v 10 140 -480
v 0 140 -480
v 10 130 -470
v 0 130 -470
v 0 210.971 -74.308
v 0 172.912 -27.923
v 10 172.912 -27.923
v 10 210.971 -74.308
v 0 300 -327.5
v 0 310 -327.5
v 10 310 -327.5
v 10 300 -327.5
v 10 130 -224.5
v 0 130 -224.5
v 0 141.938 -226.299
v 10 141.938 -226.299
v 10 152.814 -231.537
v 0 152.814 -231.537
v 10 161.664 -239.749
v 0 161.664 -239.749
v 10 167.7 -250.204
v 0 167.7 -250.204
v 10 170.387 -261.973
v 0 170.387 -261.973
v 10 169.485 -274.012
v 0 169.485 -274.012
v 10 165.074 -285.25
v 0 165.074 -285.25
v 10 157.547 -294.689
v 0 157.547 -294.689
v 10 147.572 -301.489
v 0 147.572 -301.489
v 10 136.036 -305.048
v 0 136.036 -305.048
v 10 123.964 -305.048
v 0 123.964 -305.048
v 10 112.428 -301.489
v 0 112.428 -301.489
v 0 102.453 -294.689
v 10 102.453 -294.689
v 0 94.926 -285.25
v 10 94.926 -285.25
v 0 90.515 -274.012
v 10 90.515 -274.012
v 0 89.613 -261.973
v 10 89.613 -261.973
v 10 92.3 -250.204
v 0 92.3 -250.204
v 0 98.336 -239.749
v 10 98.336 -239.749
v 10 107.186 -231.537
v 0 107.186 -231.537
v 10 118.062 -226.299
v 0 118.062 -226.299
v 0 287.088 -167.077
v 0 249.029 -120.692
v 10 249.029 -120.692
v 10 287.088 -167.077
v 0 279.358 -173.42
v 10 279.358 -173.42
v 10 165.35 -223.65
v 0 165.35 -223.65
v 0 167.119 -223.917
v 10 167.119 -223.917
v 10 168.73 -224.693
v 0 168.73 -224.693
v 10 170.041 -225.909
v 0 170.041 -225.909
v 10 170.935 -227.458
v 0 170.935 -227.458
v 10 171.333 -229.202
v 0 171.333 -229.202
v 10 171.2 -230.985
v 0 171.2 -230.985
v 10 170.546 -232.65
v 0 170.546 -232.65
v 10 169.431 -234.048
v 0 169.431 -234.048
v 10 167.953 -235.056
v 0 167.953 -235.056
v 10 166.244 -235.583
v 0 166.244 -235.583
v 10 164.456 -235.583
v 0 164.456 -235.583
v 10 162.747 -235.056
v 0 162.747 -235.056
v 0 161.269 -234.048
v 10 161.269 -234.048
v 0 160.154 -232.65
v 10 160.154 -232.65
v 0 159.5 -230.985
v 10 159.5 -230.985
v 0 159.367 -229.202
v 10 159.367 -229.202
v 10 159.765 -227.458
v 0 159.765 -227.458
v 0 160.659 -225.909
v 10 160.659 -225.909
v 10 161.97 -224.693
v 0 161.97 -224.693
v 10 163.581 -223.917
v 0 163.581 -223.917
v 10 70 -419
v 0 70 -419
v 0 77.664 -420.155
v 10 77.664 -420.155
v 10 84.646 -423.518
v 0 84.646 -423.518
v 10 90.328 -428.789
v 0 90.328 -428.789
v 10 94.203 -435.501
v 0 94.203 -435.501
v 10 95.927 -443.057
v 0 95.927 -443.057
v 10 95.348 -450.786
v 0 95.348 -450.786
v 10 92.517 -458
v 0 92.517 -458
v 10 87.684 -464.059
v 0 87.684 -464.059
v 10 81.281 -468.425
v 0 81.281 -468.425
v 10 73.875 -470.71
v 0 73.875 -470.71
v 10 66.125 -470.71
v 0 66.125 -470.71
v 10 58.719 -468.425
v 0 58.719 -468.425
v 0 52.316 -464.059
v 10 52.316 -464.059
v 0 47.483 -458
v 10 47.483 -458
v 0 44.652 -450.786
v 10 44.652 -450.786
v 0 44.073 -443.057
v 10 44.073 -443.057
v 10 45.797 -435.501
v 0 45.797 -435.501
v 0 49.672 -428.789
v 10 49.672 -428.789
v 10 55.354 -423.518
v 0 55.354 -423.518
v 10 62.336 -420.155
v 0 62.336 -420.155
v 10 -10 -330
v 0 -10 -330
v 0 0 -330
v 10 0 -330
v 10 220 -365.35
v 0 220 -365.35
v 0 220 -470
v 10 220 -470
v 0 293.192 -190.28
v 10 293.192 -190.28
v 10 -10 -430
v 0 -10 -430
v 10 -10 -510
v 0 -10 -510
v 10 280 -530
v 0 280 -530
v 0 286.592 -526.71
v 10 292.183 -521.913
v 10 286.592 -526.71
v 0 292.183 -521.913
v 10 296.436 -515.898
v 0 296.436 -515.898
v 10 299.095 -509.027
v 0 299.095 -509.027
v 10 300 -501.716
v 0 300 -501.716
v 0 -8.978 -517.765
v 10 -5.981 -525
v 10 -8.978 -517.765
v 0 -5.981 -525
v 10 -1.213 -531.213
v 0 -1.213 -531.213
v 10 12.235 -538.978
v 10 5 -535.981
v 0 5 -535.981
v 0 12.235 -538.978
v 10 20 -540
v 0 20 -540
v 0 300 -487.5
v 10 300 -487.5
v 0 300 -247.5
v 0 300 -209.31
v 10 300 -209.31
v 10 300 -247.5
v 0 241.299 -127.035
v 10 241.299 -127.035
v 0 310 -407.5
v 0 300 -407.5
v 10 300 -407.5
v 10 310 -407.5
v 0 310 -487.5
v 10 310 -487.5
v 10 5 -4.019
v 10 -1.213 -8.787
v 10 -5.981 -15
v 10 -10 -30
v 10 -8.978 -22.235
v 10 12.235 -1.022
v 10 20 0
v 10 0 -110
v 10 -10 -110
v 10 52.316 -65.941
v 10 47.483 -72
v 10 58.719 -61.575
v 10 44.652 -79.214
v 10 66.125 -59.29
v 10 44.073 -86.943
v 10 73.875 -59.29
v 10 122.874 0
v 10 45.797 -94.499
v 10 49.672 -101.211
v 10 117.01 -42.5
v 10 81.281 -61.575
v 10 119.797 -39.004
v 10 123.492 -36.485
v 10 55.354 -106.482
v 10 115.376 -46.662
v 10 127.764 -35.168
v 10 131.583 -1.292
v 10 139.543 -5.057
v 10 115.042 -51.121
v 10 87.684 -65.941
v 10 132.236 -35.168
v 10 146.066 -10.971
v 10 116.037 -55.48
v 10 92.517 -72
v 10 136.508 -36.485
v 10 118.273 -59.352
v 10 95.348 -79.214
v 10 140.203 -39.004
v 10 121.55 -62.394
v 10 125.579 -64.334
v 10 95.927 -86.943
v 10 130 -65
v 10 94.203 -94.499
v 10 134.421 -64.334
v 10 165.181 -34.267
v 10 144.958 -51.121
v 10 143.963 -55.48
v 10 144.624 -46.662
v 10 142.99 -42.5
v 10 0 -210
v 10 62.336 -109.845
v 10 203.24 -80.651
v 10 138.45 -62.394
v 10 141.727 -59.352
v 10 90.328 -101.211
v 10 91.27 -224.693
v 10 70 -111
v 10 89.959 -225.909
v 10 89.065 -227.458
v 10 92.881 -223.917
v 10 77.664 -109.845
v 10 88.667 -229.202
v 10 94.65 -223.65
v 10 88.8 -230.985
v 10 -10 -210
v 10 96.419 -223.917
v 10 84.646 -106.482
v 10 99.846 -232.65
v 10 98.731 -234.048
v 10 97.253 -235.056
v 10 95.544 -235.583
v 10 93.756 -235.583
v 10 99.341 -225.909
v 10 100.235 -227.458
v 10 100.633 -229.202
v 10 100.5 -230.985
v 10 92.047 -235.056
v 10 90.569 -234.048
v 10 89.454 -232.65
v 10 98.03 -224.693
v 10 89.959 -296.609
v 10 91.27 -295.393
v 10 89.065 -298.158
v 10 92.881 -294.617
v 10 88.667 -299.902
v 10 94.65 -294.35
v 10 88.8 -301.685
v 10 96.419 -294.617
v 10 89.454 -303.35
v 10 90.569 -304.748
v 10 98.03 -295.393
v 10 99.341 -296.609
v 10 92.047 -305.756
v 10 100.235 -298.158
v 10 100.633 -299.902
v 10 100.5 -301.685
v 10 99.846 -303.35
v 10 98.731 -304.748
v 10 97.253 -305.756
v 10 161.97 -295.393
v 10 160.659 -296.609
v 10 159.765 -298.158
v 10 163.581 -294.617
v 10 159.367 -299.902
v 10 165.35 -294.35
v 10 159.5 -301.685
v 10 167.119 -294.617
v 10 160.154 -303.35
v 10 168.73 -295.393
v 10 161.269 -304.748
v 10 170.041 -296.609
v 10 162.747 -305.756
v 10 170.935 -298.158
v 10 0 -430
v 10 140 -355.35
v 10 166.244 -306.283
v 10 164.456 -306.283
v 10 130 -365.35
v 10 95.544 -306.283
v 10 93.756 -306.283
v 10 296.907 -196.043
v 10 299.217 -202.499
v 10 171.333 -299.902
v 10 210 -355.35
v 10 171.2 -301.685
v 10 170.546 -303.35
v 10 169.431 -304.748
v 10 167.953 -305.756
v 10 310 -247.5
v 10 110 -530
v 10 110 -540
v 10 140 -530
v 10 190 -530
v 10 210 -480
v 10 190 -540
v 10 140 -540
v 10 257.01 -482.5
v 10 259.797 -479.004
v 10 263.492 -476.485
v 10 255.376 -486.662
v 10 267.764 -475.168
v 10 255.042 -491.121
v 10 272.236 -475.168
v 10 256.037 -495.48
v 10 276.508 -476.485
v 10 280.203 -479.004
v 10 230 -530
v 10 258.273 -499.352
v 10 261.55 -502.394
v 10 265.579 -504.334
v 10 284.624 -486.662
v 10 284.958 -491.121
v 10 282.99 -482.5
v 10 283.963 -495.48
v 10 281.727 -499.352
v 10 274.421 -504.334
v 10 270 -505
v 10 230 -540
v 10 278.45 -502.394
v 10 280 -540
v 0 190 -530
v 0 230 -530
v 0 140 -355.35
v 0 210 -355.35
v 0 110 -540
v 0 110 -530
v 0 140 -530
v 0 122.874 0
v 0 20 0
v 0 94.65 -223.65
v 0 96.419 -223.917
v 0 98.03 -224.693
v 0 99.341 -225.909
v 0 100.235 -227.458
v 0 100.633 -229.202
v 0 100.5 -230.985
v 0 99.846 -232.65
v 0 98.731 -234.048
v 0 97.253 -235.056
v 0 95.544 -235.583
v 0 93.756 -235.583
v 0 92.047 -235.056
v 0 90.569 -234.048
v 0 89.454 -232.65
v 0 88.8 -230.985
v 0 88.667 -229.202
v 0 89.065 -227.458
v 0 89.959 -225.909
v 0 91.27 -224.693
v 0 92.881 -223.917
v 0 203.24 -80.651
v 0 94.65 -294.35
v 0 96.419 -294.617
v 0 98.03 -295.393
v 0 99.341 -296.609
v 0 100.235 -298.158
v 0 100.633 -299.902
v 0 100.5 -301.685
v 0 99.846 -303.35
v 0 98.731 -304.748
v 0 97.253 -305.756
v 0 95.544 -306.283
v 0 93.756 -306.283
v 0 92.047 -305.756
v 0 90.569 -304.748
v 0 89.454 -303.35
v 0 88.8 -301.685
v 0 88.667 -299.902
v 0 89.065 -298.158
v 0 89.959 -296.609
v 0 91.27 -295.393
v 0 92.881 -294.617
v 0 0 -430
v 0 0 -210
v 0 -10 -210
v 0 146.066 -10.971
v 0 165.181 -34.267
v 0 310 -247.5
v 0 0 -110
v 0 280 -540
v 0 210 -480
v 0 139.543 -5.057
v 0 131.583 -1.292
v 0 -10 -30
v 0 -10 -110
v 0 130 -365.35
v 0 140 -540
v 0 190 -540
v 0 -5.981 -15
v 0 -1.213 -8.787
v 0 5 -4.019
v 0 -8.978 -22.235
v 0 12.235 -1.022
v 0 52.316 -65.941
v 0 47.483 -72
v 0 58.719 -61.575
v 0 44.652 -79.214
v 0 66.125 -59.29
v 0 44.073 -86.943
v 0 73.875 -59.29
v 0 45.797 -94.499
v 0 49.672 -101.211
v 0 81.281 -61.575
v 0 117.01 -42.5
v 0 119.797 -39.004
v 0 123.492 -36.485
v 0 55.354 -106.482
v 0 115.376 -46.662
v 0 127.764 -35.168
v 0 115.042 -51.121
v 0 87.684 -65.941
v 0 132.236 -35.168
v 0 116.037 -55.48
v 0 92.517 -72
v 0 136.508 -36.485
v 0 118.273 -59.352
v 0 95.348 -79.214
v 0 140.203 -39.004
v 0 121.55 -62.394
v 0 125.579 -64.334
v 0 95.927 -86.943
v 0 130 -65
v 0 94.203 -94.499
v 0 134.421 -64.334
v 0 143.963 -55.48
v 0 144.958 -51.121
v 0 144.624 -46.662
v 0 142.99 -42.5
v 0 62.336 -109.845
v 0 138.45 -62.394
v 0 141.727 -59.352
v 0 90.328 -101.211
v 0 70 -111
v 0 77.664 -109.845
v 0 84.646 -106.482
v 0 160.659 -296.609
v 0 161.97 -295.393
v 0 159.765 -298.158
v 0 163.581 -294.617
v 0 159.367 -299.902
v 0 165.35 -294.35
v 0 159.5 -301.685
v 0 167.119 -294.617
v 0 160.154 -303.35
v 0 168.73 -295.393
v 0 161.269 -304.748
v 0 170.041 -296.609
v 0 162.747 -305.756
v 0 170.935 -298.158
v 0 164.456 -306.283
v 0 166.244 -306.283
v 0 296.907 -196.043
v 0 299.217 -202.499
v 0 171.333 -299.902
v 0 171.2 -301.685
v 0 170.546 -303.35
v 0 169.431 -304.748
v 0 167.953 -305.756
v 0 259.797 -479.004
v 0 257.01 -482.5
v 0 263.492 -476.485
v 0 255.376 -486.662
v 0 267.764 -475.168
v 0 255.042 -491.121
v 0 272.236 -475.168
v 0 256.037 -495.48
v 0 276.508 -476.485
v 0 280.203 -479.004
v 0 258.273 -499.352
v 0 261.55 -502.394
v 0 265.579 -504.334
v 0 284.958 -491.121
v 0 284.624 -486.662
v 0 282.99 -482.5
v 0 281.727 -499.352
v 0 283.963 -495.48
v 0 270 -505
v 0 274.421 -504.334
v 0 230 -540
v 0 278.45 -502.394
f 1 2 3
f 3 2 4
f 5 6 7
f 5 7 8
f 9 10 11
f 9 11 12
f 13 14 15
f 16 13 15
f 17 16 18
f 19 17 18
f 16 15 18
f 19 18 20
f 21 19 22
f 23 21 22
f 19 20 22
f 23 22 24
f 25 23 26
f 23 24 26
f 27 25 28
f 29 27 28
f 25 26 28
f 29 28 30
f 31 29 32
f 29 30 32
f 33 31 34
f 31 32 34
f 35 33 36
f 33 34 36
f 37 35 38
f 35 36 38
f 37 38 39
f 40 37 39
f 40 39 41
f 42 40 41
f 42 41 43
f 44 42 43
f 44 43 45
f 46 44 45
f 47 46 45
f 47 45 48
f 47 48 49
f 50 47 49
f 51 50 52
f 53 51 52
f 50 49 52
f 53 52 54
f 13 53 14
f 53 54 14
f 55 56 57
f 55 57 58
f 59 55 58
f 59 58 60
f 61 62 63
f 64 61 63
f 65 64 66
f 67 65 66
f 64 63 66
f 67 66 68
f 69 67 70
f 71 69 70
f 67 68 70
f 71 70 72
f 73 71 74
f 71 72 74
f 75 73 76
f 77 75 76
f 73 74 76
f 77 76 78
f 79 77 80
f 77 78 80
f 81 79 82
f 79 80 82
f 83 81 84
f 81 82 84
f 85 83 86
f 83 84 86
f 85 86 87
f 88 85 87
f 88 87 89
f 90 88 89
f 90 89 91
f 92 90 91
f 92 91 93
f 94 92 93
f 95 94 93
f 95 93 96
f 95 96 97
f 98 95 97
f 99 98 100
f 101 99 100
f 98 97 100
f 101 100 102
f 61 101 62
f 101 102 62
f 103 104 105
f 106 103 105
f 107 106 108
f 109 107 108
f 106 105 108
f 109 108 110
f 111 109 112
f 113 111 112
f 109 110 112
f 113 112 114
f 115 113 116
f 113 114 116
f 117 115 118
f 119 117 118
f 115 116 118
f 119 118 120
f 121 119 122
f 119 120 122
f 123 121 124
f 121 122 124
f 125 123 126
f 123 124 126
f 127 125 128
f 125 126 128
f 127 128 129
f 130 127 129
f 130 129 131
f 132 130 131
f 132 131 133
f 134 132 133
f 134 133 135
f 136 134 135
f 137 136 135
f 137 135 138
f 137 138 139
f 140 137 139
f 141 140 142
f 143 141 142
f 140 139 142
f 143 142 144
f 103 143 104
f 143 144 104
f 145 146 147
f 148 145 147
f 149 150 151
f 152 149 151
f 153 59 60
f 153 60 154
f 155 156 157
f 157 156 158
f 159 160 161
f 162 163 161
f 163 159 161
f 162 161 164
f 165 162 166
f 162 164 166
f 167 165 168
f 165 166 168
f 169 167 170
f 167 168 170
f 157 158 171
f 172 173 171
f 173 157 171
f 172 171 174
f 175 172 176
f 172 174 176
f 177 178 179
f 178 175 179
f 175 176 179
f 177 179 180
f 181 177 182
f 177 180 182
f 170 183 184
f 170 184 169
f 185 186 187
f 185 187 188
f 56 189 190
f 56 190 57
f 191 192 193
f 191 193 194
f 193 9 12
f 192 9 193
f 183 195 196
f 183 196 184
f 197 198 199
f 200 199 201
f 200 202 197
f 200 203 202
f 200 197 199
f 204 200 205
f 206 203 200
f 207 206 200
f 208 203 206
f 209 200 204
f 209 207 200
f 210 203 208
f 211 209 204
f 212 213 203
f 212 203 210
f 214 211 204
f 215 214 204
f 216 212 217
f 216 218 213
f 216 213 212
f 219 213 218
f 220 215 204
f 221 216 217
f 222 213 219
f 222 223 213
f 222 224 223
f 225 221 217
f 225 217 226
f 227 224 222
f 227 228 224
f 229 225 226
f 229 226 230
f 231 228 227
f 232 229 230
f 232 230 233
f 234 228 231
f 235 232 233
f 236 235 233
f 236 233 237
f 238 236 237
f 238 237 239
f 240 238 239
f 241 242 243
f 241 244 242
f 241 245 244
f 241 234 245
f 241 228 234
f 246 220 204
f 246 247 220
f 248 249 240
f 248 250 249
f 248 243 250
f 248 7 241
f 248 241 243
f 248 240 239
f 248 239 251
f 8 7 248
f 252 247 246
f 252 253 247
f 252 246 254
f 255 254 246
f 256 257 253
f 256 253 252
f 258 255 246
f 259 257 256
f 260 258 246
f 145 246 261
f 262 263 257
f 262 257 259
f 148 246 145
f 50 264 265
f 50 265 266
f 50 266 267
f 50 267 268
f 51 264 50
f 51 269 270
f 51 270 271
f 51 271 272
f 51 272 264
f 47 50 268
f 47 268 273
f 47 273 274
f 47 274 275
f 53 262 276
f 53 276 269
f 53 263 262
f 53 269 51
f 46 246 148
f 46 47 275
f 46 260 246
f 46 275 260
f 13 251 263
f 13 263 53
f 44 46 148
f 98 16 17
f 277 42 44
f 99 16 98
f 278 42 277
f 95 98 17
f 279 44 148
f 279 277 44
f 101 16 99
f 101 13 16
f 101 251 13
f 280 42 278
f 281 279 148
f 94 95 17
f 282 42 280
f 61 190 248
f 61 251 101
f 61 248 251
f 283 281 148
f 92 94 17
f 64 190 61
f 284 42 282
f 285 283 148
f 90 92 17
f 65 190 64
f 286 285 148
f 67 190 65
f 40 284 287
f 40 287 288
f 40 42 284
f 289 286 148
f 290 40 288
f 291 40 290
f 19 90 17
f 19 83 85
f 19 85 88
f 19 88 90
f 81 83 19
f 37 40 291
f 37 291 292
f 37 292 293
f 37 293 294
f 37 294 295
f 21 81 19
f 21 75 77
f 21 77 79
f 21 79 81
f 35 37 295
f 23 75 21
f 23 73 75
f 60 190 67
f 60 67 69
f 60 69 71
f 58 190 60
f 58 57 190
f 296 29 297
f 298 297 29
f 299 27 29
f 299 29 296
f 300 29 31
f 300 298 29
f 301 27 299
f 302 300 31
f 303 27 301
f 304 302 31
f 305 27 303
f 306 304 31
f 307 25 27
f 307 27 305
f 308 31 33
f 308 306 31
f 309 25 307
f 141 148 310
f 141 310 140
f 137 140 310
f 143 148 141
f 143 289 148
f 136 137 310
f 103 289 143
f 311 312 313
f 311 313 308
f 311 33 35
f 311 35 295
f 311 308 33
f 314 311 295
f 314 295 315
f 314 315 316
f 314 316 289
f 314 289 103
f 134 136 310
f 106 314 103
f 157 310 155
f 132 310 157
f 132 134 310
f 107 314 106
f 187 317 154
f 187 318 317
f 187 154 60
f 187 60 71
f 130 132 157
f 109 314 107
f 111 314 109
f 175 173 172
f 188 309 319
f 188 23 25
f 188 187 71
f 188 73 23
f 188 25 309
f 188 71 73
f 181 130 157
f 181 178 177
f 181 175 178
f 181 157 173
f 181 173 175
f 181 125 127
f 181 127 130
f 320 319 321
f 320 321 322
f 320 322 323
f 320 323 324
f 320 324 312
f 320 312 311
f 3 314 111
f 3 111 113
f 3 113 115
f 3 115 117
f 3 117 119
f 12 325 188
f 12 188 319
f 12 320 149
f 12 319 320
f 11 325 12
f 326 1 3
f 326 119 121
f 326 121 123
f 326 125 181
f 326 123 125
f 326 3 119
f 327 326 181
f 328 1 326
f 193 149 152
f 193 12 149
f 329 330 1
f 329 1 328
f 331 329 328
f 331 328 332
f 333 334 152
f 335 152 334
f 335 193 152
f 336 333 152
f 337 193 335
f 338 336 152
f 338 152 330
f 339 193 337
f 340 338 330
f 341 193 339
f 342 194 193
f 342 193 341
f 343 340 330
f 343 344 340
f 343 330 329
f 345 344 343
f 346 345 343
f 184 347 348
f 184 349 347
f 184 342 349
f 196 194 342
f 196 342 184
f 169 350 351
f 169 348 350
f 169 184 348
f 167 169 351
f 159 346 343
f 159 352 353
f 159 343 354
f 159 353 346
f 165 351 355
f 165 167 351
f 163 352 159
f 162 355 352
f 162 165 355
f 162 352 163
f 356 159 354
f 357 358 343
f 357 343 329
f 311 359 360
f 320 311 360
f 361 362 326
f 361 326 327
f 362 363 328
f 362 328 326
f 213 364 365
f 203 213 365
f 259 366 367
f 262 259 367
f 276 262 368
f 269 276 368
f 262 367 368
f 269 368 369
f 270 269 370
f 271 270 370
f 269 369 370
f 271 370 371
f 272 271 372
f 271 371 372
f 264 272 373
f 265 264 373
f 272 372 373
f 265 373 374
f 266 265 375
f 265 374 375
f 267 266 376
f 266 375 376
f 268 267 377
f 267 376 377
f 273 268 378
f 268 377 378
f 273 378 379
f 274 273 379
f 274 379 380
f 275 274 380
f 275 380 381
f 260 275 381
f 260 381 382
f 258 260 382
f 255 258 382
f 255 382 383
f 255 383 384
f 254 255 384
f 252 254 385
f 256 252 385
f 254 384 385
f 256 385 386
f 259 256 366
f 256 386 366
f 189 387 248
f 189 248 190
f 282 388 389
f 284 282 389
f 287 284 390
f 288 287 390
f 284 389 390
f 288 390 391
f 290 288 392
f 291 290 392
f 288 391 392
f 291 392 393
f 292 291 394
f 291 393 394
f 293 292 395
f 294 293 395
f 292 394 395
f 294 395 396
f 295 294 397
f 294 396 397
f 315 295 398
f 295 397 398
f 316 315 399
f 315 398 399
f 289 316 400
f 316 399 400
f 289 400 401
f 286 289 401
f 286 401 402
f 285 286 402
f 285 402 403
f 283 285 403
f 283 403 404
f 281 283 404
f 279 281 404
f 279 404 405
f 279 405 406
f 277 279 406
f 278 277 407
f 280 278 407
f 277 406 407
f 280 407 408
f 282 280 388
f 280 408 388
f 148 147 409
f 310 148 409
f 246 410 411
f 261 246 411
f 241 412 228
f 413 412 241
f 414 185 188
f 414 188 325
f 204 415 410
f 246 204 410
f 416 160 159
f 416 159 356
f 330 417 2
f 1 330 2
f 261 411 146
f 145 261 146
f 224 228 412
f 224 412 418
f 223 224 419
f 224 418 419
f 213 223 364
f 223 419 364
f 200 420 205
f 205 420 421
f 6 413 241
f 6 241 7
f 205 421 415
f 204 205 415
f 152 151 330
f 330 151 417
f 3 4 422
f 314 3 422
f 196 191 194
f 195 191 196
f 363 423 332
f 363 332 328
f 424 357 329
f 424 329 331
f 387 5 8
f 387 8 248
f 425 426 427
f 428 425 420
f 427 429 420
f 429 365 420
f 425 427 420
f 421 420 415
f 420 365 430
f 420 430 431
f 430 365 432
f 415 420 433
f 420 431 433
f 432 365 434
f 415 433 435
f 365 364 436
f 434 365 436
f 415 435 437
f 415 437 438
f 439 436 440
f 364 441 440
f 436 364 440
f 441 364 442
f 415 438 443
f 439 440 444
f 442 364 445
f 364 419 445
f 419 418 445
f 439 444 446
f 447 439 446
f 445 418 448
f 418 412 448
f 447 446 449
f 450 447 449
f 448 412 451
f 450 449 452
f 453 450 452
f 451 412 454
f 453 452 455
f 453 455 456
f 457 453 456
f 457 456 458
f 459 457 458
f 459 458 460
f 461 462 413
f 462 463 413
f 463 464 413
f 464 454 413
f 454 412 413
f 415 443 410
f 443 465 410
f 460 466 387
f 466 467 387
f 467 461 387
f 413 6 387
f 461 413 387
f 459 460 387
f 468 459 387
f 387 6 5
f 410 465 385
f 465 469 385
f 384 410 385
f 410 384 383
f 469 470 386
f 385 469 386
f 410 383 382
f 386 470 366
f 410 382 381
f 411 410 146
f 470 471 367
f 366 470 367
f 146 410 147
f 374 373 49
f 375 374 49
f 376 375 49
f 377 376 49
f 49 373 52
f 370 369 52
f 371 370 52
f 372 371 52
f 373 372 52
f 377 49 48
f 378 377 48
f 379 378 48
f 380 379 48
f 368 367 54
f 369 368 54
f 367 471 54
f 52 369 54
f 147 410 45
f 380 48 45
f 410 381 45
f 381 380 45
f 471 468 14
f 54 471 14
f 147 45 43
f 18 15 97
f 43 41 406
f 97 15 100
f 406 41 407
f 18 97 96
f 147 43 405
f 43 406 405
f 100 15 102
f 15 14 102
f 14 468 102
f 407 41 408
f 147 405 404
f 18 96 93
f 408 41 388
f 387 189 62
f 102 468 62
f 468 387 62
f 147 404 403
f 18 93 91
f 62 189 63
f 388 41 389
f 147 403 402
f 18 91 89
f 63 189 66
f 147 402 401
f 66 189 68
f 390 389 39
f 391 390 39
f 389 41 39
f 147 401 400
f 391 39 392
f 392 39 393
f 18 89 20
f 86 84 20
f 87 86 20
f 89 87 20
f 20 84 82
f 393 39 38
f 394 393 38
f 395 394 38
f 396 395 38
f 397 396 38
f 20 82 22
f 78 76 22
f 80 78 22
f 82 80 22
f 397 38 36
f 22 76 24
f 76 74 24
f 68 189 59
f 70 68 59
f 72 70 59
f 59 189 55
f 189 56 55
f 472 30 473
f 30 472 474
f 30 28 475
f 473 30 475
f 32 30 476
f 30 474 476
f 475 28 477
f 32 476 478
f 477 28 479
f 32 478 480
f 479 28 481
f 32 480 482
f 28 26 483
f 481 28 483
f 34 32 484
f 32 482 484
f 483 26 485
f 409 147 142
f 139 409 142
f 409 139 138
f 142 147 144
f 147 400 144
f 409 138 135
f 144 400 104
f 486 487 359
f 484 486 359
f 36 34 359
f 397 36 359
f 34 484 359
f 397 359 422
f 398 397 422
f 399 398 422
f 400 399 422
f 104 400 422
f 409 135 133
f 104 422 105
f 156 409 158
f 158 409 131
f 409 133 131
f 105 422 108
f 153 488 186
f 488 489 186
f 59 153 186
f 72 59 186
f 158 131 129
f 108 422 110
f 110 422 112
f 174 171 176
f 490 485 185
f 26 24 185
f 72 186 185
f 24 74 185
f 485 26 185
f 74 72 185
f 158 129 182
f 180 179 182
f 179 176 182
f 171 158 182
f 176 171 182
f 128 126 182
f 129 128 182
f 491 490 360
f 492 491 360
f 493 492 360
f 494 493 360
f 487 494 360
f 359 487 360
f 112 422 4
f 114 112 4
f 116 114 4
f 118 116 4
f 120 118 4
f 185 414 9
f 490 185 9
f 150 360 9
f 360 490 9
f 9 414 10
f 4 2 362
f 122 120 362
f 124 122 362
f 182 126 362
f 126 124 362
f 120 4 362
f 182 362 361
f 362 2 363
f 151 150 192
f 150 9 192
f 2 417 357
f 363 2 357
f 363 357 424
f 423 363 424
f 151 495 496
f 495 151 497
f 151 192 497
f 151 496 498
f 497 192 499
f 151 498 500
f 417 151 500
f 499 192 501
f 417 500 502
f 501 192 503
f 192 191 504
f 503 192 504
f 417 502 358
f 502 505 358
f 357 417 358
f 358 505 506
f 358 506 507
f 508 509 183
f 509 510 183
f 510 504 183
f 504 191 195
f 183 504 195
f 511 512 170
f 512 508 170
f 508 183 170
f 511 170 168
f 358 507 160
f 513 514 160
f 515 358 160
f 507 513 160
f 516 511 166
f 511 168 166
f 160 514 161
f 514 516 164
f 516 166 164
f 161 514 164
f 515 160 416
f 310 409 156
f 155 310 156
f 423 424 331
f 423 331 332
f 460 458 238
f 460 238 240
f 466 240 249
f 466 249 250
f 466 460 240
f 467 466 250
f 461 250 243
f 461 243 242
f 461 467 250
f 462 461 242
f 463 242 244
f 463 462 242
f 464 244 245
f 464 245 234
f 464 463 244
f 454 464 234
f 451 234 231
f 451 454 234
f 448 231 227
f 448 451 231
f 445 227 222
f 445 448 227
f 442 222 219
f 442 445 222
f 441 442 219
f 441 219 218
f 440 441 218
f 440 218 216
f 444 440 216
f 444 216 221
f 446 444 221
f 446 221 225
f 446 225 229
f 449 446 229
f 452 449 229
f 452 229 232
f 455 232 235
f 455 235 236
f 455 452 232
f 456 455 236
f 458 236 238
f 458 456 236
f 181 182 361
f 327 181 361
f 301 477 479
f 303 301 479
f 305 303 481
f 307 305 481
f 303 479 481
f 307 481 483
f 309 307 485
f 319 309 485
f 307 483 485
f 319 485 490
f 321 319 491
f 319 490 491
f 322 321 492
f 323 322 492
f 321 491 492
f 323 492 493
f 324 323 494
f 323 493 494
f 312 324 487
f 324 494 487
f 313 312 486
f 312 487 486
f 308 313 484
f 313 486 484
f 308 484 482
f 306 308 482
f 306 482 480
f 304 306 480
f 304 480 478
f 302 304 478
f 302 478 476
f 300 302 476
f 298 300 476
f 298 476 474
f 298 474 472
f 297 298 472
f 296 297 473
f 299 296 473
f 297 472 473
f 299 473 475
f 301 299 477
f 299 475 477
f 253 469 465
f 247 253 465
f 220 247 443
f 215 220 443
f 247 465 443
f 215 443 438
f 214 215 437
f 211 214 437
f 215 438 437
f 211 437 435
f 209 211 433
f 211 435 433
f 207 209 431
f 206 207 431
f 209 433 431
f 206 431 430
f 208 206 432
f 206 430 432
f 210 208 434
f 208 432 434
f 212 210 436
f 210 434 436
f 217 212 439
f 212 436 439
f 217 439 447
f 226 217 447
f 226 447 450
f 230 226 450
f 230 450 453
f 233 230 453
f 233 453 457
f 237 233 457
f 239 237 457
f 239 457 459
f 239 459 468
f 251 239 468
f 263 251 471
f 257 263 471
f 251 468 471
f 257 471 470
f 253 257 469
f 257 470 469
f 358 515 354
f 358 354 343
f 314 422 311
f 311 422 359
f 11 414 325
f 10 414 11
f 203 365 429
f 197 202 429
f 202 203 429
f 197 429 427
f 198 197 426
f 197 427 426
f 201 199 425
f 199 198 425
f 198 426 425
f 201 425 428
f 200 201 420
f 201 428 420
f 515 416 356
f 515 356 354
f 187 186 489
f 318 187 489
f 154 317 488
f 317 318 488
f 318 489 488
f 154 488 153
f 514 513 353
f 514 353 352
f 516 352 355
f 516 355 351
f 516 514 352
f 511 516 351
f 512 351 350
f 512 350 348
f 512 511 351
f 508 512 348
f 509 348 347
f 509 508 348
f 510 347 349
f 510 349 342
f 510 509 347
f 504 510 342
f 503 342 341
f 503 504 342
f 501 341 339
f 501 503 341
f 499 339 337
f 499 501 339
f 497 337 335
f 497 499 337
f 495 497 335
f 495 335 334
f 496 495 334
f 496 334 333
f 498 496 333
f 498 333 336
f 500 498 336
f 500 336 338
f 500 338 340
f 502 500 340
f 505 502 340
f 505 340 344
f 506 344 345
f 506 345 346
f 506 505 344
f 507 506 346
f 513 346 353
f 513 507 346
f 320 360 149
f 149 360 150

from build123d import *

# Parameters (mm, degrees)
ESQUISSE1_R             = 15
BOSS_EXTRU_1_DEPTH      = 10
ESQUISSE5_R             = 40.5
ESQUISSE5_R_2           = 6
ENL_V_MAT_EXTRU_1_DEPTH = 10
ESQUISSE6_R             = 26
ENL_V_MAT_EXTRU_2_DEPTH = 10
ENL_V_MAT_EXTRU_3_DEPTH = 10
CONG_1_R                = 30
ENL_V_MAT_EXTRU_4_DEPTH = 10


with BuildPart() as part:
    # Esquisse1 → Boss.-Extru.1 (new body)
    with BuildSketch(Plane(origin=(0, 0, 0), x_dir=(0, 0, -1), z_dir=(1, 0, 0))):
        Polygon((540, 0), (540, 310), (195, 310), (0, 150), (0, 0), (0, -10), (110, -10), (110, 0), (210, 0), (210, -10), (330, -10), (330, 0), (430, 0), (430, -10), (540, -10), align=None)
        with Locations((490, 270)):
            Circle(ESQUISSE1_R, mode=Mode.SUBTRACT)
        with Locations((50, 130)):
            Circle(ESQUISSE1_R, mode=Mode.SUBTRACT)
    extrude(amount=BOSS_EXTRU_1_DEPTH)

    # Esquisse5 → Enlèv. mat.-Extru.1 (cut)
    with BuildSketch(Plane.ZY):
        with Locations((-265, 130)):
            Circle(ESQUISSE5_R)
        with Locations((-300.35, 94.65)):
            Circle(ESQUISSE5_R_2)
        with Locations((-300.35, 165.35)):
            Circle(ESQUISSE5_R_2)
        with Locations((-229.65, 165.35)):
            Circle(ESQUISSE5_R_2)
        with Locations((-229.65, 94.65)):
            Circle(ESQUISSE5_R_2)
    extrude(amount=-ENL_V_MAT_EXTRU_1_DEPTH, mode=Mode.SUBTRACT)

    # Esquisse6 → Enlèv. mat.-Extru.2 (cut)
    with BuildSketch(Plane.ZY):
        with Locations((-445, 70)):
            Circle(ESQUISSE6_R)
        with Locations(Location((-85, 70, 0), (0, 0, 180))):
            Circle(ESQUISSE6_R)
    extrude(amount=-ENL_V_MAT_EXTRU_2_DEPTH, mode=Mode.SUBTRACT)

    # Esquisse7 → Enlèv. mat.-Extru.3 (cut)
    with BuildSketch(Plane.ZY):
        Polygon((-198.57749782, 300), (-247.5, 300), (-247.5, 310), (-327.5, 310), (-327.5, 300), (-407.5, 300), (-407.5, 310), (-487.5, 310), (-487.5, 300), (-530, 300), (-530, 280), (-540, 280), (-540, 230), (-530, 230), (-530, 190), (-540, 190), (-540, 140), (-530, 140), (-530, 110), (-794.780536076, 110), (-794.780536076, 495.732813741), (95.631773419, 495.732813741), (95.631773419, 137.064617174), (0, 137.064617174), (-34.266562773, 165.180771244), (-27.923396657, 172.911504949), (-74.307798886, 210.97050165), (-80.650965002, 203.239767945), (-127.035367231, 241.298764646), (-120.692201114, 249.02949835), (-167.076603343, 287.088495051), (-173.41976946, 279.357761346), align=None)
    extrude(amount=-ENL_V_MAT_EXTRU_3_DEPTH, mode=Mode.SUBTRACT)

    # Congé1
    # the kernel refuses this fillet: 30 mm, written as the material it takes off along each edge
    with BuildSketch(Plane(origin=(-75, -10, -540), x_dir=(0, 1, 0), z_dir=(1, 0, 0)), Plane(origin=(-75, -10, 0), x_dir=(0, 0, -1), z_dir=(1, 0, 0))) as cong_1_piece_1:
        with BuildLine():
            CenterArc((CONG_1_R, CONG_1_R), CONG_1_R, 180, 90)
            Line((0, CONG_1_R), (-CONG_1_R * 0.02, CONG_1_R))
            Line((-CONG_1_R * 0.02, CONG_1_R), (-CONG_1_R * 0.02, -CONG_1_R * 0.02))
            Line((-CONG_1_R * 0.02, -CONG_1_R * 0.02), (CONG_1_R, -CONG_1_R * 0.02))
            Line((CONG_1_R, -CONG_1_R * 0.02), (CONG_1_R, 0))
        make_face()
    extrude(amount=160, mode=Mode.SUBTRACT)
    with BuildSketch(Plane(origin=(-70.710678119, 300, -530), x_dir=(0, -1, 0), z_dir=(1, 0, 0))) as cong_1_piece_2:
        with BuildLine():
            CenterArc((30, -28.284271247), CONG_1_R, 109.471220634, 70.528779366)
            Line((0, -28.284271247), (-0.6, -28.284271247))
            Line((-0.6, -28.284271247), (-0.6, 0))
            Line((-0.6, 0), (0, 0.6))
            ThreePointArc((0, 0.6), (10, 0.6), (19.8, 0.565685425))
            Line((19.8, 0.565685425), (20, 0))
        make_face()
    extrude(amount=151.421356237, mode=Mode.SUBTRACT)
    with BuildSketch(Plane(origin=(-35.476909659, 137.064617174, 0), x_dir=(0, -1, 0), z_dir=(1, 0, 0))) as cong_1_piece_3:
        with BuildLine():
            CenterArc((CONG_1_R * 0.473025462116, CONG_1_R), CONG_1_R, 219.369317242, 50.630682758)
            Line((-CONG_1_R * 0.300047908367, CONG_1_R * 0.365683388322), (-CONG_1_R * 0.315509375776, CONG_1_R * 0.352997056088))
            Line((-CONG_1_R * 0.315509375776, CONG_1_R * 0.352997056088), (-CONG_1_R * 0.00946050924232, -CONG_1_R * 0.02))
            Line((-CONG_1_R * 0.00946050924232, -CONG_1_R * 0.02), (CONG_1_R * 0.473025462116, -CONG_1_R * 0.02))
            Line((CONG_1_R * 0.473025462116, -CONG_1_R * 0.02), (CONG_1_R * 0.473025462116, 0))
        make_face()
    extrude(amount=80.953819317, mode=Mode.SUBTRACT)
    with BuildSketch(Plane(origin=(-26.831233647, 300, -198.57749782), x_dir=(0, -0.634316611678022, 0.7730733704825911), z_dir=(1, 0, 0))) as cong_1_piece_4:
        with BuildLine():
            CenterArc((CONG_1_R * 0.357749781954, CONG_1_R), CONG_1_R, 230.630682758, 39.369317242)
            Line((-CONG_1_R * 0.276566829724, CONG_1_R * 0.226926629517), (-CONG_1_R * 0.289253161958, CONG_1_R * 0.211465162108))
            Line((-CONG_1_R * 0.289253161958, CONG_1_R * 0.211465162108), (-CONG_1_R * 0.00715499563907, -CONG_1_R * 0.02))
            Line((-CONG_1_R * 0.00715499563907, -CONG_1_R * 0.02), (CONG_1_R * 0.357749781954, -CONG_1_R * 0.02))
            Line((CONG_1_R * 0.357749781954, -CONG_1_R * 0.02), (CONG_1_R * 0.357749781954, 0))
        make_face()
    extrude(amount=63.662467293, mode=Mode.SUBTRACT)

    # Esquisse8 → Enlèv. mat.-Extru.4 (cut)
    with BuildSketch(Plane.ZY):
        Polygon((-355.35, 210), (-365.35, 220), (-470, 220), (-480, 210), (-480, 140), (-470, 130), (-365.35, 130), (-355.35, 140), align=None)
    extrude(amount=-ENL_V_MAT_EXTRU_4_DEPTH, mode=Mode.SUBTRACT)


solid = part.part
